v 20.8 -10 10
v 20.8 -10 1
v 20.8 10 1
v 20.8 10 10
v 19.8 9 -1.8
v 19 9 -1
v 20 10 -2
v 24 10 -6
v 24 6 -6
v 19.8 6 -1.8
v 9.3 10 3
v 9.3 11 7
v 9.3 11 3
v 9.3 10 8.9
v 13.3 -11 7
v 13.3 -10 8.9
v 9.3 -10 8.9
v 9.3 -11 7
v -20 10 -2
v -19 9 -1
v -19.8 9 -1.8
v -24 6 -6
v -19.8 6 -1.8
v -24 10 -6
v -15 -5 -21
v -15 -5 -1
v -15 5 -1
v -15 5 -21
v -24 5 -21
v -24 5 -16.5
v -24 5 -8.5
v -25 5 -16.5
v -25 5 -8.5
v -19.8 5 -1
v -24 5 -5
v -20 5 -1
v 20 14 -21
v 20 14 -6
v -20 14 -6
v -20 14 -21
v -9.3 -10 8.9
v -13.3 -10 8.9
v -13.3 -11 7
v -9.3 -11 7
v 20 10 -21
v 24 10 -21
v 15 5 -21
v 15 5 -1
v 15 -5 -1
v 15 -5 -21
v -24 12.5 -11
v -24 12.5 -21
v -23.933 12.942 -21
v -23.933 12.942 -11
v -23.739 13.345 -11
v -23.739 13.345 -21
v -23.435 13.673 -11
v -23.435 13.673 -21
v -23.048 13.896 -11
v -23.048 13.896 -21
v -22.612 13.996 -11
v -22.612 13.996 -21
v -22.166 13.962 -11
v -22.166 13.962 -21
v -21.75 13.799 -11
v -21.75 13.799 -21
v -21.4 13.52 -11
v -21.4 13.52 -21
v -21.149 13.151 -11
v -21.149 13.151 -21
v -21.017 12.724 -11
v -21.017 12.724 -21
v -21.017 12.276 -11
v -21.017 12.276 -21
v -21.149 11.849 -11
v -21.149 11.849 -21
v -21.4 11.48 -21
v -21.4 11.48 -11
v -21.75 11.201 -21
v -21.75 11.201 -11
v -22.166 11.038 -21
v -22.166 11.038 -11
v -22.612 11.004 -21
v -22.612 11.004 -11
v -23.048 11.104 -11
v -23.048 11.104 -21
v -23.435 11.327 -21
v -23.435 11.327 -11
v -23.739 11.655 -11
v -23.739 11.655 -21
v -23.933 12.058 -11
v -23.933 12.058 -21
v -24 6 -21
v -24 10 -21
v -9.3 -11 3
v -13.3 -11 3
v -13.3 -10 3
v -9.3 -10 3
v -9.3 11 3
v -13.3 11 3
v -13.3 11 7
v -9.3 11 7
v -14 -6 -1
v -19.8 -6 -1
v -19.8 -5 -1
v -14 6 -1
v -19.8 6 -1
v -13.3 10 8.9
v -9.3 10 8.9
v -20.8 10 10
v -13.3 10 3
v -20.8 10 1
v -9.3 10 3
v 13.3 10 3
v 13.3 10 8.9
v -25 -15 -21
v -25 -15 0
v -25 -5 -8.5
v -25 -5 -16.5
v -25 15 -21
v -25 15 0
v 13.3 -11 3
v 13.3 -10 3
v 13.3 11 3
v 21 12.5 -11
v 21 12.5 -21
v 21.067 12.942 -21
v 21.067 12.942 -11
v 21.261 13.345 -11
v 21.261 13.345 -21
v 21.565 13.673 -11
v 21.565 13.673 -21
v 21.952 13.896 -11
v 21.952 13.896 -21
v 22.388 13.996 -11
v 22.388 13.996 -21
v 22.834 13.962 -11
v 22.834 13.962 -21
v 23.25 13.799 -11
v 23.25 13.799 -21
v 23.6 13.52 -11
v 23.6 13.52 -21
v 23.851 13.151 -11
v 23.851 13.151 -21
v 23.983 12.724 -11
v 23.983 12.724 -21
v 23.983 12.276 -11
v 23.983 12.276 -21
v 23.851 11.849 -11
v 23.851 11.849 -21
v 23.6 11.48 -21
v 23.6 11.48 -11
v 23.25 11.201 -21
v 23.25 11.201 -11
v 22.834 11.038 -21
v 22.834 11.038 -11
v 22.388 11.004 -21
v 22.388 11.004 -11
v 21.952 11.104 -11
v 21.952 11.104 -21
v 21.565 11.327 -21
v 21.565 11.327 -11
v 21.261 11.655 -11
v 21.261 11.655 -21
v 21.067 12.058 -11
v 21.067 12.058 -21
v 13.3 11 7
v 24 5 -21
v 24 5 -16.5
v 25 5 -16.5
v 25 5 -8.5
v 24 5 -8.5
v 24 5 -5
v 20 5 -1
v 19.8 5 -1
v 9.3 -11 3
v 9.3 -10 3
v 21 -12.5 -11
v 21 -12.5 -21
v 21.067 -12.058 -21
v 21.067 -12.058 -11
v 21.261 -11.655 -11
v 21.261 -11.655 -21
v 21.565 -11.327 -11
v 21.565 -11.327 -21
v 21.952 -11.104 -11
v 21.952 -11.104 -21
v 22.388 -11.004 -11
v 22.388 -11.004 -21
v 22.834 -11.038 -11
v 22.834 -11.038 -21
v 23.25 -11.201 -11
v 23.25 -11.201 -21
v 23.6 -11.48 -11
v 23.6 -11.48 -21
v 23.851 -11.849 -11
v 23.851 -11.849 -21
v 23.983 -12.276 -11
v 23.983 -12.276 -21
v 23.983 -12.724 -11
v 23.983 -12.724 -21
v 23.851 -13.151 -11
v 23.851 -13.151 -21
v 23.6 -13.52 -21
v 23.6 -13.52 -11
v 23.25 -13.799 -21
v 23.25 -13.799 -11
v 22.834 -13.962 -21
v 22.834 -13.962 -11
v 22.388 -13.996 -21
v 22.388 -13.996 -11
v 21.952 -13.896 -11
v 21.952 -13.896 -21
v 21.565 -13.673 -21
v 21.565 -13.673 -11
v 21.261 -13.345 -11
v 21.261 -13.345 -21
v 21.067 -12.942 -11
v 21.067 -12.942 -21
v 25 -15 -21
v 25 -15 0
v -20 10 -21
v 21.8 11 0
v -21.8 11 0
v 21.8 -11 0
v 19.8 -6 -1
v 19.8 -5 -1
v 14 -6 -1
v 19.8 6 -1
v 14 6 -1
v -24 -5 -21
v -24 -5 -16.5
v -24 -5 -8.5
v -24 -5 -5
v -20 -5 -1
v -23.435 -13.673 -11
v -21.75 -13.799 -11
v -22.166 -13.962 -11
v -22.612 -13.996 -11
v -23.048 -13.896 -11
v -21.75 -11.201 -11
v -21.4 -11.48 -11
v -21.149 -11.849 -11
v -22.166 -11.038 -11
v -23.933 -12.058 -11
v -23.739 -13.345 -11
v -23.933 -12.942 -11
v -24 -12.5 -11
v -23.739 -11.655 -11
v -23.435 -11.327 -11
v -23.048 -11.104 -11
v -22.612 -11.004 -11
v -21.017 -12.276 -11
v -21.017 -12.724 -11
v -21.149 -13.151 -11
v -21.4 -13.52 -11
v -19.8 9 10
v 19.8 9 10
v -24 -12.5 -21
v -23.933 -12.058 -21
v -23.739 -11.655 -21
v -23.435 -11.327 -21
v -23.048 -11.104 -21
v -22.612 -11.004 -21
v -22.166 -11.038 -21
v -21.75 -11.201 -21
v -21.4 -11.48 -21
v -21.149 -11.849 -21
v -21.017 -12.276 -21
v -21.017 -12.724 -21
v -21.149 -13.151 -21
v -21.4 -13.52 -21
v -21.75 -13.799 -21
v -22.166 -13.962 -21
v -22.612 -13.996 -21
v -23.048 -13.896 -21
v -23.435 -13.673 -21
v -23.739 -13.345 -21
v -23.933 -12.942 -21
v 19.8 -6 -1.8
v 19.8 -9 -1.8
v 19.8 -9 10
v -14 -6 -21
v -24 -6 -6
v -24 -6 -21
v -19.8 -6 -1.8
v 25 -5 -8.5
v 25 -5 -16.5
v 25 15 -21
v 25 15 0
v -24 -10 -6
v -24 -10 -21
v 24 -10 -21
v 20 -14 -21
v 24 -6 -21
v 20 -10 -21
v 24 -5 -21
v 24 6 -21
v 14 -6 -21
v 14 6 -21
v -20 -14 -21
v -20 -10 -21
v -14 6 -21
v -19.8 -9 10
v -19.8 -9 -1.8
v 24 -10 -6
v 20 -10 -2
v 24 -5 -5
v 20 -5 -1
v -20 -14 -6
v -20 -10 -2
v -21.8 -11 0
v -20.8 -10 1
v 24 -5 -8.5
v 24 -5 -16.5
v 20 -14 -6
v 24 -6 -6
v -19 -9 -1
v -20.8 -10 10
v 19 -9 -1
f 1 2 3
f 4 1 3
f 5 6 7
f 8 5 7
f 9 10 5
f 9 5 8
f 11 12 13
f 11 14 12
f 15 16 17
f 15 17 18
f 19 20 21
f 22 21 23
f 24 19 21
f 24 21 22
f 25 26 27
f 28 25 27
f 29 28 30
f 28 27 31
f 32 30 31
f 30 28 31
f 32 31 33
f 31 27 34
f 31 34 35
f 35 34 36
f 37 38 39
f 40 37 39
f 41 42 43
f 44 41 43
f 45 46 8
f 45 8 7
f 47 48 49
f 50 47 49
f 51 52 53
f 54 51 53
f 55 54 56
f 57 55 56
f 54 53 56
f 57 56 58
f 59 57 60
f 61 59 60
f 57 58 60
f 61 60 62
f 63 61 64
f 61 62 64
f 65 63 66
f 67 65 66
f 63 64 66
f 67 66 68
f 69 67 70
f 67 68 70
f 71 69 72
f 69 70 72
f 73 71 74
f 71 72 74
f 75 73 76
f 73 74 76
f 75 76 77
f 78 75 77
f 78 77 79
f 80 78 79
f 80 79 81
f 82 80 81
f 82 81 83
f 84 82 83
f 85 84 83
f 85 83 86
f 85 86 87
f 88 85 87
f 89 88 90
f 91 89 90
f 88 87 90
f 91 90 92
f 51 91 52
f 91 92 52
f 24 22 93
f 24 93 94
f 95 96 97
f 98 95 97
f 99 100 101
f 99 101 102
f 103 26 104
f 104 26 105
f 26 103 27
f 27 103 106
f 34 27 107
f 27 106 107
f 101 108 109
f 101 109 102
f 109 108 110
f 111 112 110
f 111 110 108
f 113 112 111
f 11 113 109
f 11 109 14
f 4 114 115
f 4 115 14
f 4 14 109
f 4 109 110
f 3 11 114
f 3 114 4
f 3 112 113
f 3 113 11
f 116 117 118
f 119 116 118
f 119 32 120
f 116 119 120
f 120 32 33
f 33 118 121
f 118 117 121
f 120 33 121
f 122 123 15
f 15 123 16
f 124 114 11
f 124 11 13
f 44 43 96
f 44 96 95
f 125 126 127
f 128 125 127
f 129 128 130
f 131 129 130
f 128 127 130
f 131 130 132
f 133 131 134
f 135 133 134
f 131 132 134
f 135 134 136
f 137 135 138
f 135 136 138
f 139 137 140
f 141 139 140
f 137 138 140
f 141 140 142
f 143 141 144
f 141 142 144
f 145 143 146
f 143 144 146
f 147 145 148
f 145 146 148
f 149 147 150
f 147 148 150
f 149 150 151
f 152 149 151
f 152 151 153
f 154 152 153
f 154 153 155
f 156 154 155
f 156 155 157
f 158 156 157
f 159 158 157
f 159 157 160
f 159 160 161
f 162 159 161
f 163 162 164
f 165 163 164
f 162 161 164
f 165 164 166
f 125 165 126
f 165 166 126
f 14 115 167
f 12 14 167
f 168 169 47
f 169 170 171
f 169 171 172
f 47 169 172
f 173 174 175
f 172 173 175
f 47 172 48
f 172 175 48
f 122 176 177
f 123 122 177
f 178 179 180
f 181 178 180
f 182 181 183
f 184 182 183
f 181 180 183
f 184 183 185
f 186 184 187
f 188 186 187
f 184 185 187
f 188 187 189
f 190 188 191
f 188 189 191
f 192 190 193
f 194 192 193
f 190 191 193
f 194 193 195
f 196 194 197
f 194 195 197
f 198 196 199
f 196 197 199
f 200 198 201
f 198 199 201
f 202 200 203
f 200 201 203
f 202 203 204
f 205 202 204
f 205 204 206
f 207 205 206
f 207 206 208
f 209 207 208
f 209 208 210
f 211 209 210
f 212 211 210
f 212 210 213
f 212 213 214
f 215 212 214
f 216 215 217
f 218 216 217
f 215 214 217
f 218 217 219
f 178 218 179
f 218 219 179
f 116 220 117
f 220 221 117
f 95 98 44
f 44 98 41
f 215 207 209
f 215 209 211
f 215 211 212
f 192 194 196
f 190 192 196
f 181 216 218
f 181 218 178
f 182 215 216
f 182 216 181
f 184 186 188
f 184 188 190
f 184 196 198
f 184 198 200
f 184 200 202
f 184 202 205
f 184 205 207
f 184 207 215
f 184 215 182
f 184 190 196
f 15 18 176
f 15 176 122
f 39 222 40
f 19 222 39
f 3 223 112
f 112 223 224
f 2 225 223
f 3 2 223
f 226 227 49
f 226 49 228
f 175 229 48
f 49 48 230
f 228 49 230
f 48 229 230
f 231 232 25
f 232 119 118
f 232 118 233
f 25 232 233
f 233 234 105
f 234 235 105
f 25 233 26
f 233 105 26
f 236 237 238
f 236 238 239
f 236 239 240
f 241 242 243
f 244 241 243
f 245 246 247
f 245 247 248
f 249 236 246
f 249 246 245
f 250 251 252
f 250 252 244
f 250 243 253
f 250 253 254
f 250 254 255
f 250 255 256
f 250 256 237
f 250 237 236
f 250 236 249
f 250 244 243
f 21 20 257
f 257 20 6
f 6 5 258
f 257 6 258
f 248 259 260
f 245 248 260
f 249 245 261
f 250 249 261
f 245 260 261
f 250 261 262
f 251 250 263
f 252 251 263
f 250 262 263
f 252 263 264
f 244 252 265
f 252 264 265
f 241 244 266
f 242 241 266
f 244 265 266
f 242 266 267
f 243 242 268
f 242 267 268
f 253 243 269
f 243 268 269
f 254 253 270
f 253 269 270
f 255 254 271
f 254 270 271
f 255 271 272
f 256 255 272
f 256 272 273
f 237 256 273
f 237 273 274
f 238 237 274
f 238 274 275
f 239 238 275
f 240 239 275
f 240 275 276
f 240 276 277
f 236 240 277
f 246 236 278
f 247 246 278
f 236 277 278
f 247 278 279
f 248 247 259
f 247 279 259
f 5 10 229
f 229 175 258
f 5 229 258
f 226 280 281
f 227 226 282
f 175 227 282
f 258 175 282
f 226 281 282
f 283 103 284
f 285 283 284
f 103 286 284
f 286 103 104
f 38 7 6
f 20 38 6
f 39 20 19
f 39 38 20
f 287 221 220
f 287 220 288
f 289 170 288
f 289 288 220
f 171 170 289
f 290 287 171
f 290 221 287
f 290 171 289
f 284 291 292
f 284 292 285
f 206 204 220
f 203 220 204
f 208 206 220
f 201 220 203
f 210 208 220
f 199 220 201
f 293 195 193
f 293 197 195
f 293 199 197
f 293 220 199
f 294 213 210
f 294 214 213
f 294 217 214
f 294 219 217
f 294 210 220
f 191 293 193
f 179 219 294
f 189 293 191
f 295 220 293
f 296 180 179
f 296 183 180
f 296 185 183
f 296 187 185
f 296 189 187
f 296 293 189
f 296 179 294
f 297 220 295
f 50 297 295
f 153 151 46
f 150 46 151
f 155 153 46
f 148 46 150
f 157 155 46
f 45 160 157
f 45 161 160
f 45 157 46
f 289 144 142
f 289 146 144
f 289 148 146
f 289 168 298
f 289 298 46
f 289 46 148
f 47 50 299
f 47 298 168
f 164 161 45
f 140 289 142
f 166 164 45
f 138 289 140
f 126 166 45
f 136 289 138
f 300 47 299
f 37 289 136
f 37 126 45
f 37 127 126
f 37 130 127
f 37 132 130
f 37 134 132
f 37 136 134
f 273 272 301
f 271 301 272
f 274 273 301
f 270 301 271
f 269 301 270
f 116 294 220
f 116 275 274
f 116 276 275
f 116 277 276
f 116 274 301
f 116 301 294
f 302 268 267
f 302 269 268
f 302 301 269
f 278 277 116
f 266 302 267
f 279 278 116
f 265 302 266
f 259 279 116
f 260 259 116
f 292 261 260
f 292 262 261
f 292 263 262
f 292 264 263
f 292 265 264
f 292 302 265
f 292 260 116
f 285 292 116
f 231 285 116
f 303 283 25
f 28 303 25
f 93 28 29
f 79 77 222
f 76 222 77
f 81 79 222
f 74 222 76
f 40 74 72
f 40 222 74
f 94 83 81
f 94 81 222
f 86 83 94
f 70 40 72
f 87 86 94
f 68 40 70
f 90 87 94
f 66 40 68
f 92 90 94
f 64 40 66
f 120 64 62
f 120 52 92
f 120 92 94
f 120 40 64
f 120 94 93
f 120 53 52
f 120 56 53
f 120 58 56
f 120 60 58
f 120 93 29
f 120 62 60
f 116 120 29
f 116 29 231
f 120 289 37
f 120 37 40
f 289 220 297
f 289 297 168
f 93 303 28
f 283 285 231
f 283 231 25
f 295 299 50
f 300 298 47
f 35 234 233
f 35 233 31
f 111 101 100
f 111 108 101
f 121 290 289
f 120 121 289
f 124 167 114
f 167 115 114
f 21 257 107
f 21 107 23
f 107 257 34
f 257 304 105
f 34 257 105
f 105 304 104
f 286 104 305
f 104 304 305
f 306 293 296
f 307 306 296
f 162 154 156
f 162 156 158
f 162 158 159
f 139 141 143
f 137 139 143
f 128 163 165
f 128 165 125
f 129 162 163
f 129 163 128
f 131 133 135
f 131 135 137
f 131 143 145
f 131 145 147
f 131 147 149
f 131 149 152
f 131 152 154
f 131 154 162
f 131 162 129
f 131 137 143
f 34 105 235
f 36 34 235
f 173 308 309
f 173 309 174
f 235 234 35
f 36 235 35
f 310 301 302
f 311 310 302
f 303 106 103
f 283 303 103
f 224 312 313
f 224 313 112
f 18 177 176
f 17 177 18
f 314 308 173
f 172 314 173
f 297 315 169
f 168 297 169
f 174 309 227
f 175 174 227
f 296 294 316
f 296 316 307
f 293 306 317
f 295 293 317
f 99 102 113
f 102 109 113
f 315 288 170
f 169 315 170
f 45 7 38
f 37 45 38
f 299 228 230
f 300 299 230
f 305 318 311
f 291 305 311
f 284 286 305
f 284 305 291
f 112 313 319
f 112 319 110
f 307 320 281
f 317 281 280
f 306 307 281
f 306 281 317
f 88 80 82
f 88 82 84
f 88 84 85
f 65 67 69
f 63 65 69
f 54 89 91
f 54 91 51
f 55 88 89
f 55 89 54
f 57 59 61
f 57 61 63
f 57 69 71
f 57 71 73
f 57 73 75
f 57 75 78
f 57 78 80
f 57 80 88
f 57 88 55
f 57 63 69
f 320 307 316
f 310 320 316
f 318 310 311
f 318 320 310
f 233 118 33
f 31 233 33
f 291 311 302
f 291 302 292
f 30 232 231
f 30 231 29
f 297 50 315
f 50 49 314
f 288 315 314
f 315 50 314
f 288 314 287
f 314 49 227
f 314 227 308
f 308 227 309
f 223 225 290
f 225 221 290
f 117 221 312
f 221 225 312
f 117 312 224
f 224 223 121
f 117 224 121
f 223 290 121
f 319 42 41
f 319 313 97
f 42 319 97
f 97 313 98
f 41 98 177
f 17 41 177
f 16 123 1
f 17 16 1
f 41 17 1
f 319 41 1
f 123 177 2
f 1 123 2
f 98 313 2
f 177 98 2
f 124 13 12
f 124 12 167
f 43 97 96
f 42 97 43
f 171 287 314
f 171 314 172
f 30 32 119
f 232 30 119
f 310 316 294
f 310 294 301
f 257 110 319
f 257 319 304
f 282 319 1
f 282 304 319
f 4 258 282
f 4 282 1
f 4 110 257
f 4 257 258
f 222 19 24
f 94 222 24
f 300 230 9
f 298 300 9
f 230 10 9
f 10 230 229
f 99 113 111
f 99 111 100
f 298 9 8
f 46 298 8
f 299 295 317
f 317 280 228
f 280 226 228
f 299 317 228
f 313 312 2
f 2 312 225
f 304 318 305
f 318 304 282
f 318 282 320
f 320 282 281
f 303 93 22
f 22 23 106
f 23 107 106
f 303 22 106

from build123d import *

# Parameters (mm, degrees)
SKETCH1_W            = 41.6
SKETCH1_H            = 20
SKETCH1_W_2          = 39.6
SKETCH1_H_2          = 18
BOSS_EXTRUDE2_DEPTH  = 10
SKETCH2_W            = 4
SKETCH2_H            = 10
BOSS_EXTRUDE3_DEPTH  = 1
SKETCH3_W            = 3
SKETCH3_H            = 1
CUT_EXTRUDE1_DEPTH   = 27
SKETCH4_W            = 4
SKETCH4_H            = 10
BOSS_EXTRUDE4_DEPTH  = 1
SKETCH5_W            = 3
SKETCH5_H            = 1
CUT_EXTRUDE2_DEPTH   = 27
SKETCH6_W            = 50
SKETCH6_H            = 30
SKETCH6_W_2          = 41.6
SKETCH6_H_2          = 20
SKETCH6_W_3          = 39.6
SKETCH6_H_3          = 18
BOSS_EXTRUDE6_DEPTH  = 1
CHAMFER1_SIZE        = 1
SKETCH7_W            = 50
SKETCH7_H            = 30
SKETCH7_W_2          = 48
SKETCH7_H_2          = 28
BOSS_EXTRUDE7_DEPTH  = 20
SKETCH8_W            = 4.2
SKETCH8_H            = 1
BOSS_EXTRUDE8_DEPTH  = 20
SKETCH9_W            = 4.2
SKETCH9_H            = 1
BOSS_EXTRUDE9_DEPTH  = 20
SKETCH10_W           = 4
SKETCH10_H           = 4
BOSS_EXTRUDE10_DEPTH = 20
SKETCH11_W           = 2
SKETCH11_H           = 10
CUT_EXTRUDE3_DEPTH   = 1
SKETCH12_W           = 2
SKETCH12_H           = 10
CUT_EXTRUDE4_DEPTH   = 1
SKETCH13_R           = 1.5
CUT_EXTRUDE5_DEPTH   = 10
CHAMFER2_SIZE        = 5
CHAMFER3_SIZE        = 5
CHAMFER4_SIZE        = 4


# Some blends are built 0.0001 mm under size
with BuildPart() as part:
    # Sketch1 → Boss-Extrude2 (new body)
    with BuildSketch(Plane.XY):
        Rectangle(SKETCH1_W, SKETCH1_H)
        Rectangle(SKETCH1_W_2, SKETCH1_H_2, mode=Mode.SUBTRACT)
    extrude(amount=BOSS_EXTRUDE2_DEPTH)

    # Sketch2 → Boss-Extrude3 (add)
    with BuildSketch(Plane.XZ.offset(10)):
        with Locations((-11.3, 5)):
            Rectangle(SKETCH2_W, SKETCH2_H)
        with Locations((11.3, 5)):
            Rectangle(SKETCH2_W, SKETCH2_H)
    extrude(amount=BOSS_EXTRUDE3_DEPTH)

    # Sketch3 → Cut-Extrude1 (cut)
    with BuildSketch(Plane.ZY.offset(13.3)):
        Polygon((8.900149248, -10), (7, -11), (10, -11), (10, -10), align=None)
        with Locations((1.5, -10.5)):
            Rectangle(SKETCH3_W, SKETCH3_H)
    extrude(amount=-CUT_EXTRUDE1_DEPTH, mode=Mode.SUBTRACT)

    # Sketch4 → Boss-Extrude4 (add)
    with BuildSketch(Plane(origin=(0, 10, 0), x_dir=(1, 0, 0), z_dir=(0, 1, 0))):
        with Locations((11.3, -5)):
            Rectangle(SKETCH4_W, SKETCH4_H)
        with Locations((-11.3, -5)):
            Rectangle(SKETCH4_W, SKETCH4_H)
    extrude(amount=BOSS_EXTRUDE4_DEPTH)

    # Sketch5 → Cut-Extrude2 (cut)
    with BuildSketch(Plane(origin=(13.3, 0, 0), x_dir=(0, 0, -1), z_dir=(1, 0, 0))):
        Polygon((-7, 11), (-10, 11), (-10, 10), (-8.900149248, 10), align=None)
        with Locations((-1.5, 10.5)):
            Rectangle(SKETCH5_W, SKETCH5_H)
    extrude(amount=-CUT_EXTRUDE2_DEPTH, mode=Mode.SUBTRACT)

    # Sketch6 → Boss-Extrude6 (add)
    # profile 1 of 2: a face of its own
    with BuildSketch(Plane(origin=(0, 0, 0), x_dir=(-1, 0, 0), z_dir=(0, 0, -1))):
        Rectangle(SKETCH6_W, SKETCH6_H)
        Rectangle(SKETCH6_W_2, SKETCH6_H_2, mode=Mode.SUBTRACT)
    # profile 2 of 2: a face of its own
    with BuildSketch(Plane(origin=(0, 0, 0), x_dir=(-1, 0, 0), z_dir=(0, 0, -1))):
        Rectangle(SKETCH6_W_2, SKETCH6_H_2)
        Rectangle(SKETCH6_W_3, SKETCH6_H_3, mode=Mode.SUBTRACT)
    extrude(amount=BOSS_EXTRUDE6_DEPTH)

    # Chamfer1
    chamfer1_edges = [part.edges().sort_by_distance(p)[0] for p in [
        (0, -10, 0),
        (-20.8, 0, 0),
        (0, 10, 0),
        (20.8, 0, 0),
    ]]
    chamfer(chamfer1_edges, length=CHAMFER1_SIZE)

    # Sketch7 → Boss-Extrude7 (add)
    with BuildSketch(Plane(origin=(0, 0, -1), x_dir=(-1, 0, 0), z_dir=(0, 0, -1))):
        Rectangle(SKETCH7_W, SKETCH7_H)
        Rectangle(SKETCH7_W_2, SKETCH7_H_2, mode=Mode.SUBTRACT)
    extrude(amount=BOSS_EXTRUDE7_DEPTH)

    # Sketch8 → Boss-Extrude8 (add)
    with BuildSketch(Plane(origin=(0, 0, -1), x_dir=(-1, 0, 0), z_dir=(0, 0, -1))):
        Polygon((-15, -5), (-19.8, -5), (-19.8, -6), (-14, -6), (-14, 6), (-19.8, 6), (-19.8, 5), (-15, 5), align=None)
        with Locations((-21.9, 5.5)):
            Rectangle(SKETCH8_W, SKETCH8_H)
        with Locations((-21.9, -5.5)):
            Rectangle(SKETCH8_W, SKETCH8_H)
    extrude(amount=BOSS_EXTRUDE8_DEPTH)

    # Sketch9 → Boss-Extrude9 (add)
    with BuildSketch(Plane(origin=(0, 0, -1), x_dir=(-1, 0, 0), z_dir=(0, 0, -1))):
        Polygon((15, 5), (19.8, 5), (19.8, 6), (14, 6), (14, -6), (19.8, -6), (19.8, -5), (15, -5), align=None)
        with Locations((21.9, 5.5)):
            Rectangle(SKETCH9_W, SKETCH9_H)
        with Locations((21.9, -5.5)):
            Rectangle(SKETCH9_W, SKETCH9_H)
    extrude(amount=BOSS_EXTRUDE9_DEPTH)

    # Sketch10 → Boss-Extrude10 (add)
    with BuildSketch(Plane(origin=(0, 0, -1), x_dir=(-1, 0, 0), z_dir=(0, 0, -1))):
        with Locations((-22, 12)):
            Rectangle(SKETCH10_W, SKETCH10_H)
        with Locations((22, 12)):
            Rectangle(SKETCH10_W, SKETCH10_H)
        with Locations((22, -12)):
            Rectangle(SKETCH10_W, SKETCH10_H)
        with Locations((-22, -12)):
            Rectangle(SKETCH10_W, SKETCH10_H)
    extrude(amount=BOSS_EXTRUDE10_DEPTH)

    # Sketch11 → Cut-Extrude3 (cut)
    with BuildSketch(Plane.ZY.offset(25)):
        Polygon((-10.5, -5), (-10.5, 5), (-16.5, 5), (-16.5, 0), (-16.5, -5), align=None)
        with Locations((-9.5, 0)):
            Rectangle(SKETCH11_W, SKETCH11_H)
    extrude(amount=-CUT_EXTRUDE3_DEPTH, mode=Mode.SUBTRACT)

    # Sketch12 → Cut-Extrude4 (cut)
    with BuildSketch(Plane(origin=(25, 0, 0), x_dir=(0, 0, -1), z_dir=(1, 0, 0))):
        with Locations((9.5, 0)):
            Rectangle(SKETCH12_W, SKETCH12_H)
        Polygon((16.5, 5), (10.5, 5), (10.5, -5), (16.5, -5), (16.5, 0), align=None)
    extrude(amount=-CUT_EXTRUDE4_DEPTH, mode=Mode.SUBTRACT)

    # Sketch13 → Cut-Extrude5 (cut)
    with BuildSketch(Plane(origin=(0, 0, -21), x_dir=(-1, 0, 0), z_dir=(0, 0, -1))):
        with Locations((-22.5, 12.5)):
            Circle(SKETCH13_R)
        with Locations((22.5, 12.5)):
            Circle(SKETCH13_R)
        with Locations((22.5, -12.5)):
            Circle(SKETCH13_R)
        with Locations((-22.5, -12.5)):
            Circle(SKETCH13_R)
    extrude(amount=-CUT_EXTRUDE5_DEPTH, mode=Mode.SUBTRACT)

    # Chamfer2
    chamfer2_edges = [part.edges().sort_by_distance(p)[0] for p in [
        (0, 14, -1),
        (0, -14, -1),
    ]]
    chamfer(chamfer2_edges, length=CHAMFER2_SIZE - 0.0001)  # a hair under: the kernel refuses the full size

    # Chamfer3
    # the kernel refuses this chamfer: 5 mm, written as the material it adds along each edge
    with BuildSketch(Plane(origin=(24, -21.85851494, -1), x_dir=(-0.9996219169112968, 0, 0.02749587661058636), z_dir=(0, 1, 0))) as chamfer3_piece_1_section:
        Polygon((CHAMFER3_SIZE * 0.999621916911, -CHAMFER3_SIZE * 0.0274958766106), (-CHAMFER3_SIZE * 0.0274958766106, -CHAMFER3_SIZE * 0.999621916911), (0, 0), align=None)
    chamfer3_piece_1 = extrude(amount=28.71692988, mode=Mode.PRIVATE)
    chamfer3_piece_1 = split(chamfer3_piece_1, bisect_by=Plane(origin=(19.8, -10.000025, -1.99995), z_dir=(1, 0, 0)), keep=Keep.TOP, mode=Mode.PRIVATE)
    chamfer3_piece_1 = split(chamfer3_piece_1, bisect_by=Plane(origin=(19.999975, -5, -1.99995), z_dir=(0, -1, 0)), keep=Keep.TOP, mode=Mode.PRIVATE)
    chamfer3_piece_1 = split(chamfer3_piece_1, bisect_by=Plane(origin=(19.999975, -10.0000375, -1.9999375), z_dir=(0, 0.7071067811865476, -0.7071067811865476)), keep=Keep.TOP, mode=Mode.PRIVATE)
    add(chamfer3_piece_1)
    with BuildSketch(Plane(origin=(24, -21.85851494, -1), x_dir=(-0.9996219169112968, 0, 0.02749587661058636), z_dir=(0, 1, 0))) as chamfer3_piece_2_section:
        Polygon((CHAMFER3_SIZE * 0.999621916911, -CHAMFER3_SIZE * 0.0274958766106), (-CHAMFER3_SIZE * 0.0274958766106, -CHAMFER3_SIZE * 0.999621916911), (0, 0), align=None)
    chamfer3_piece_2 = extrude(amount=28.71692988, mode=Mode.PRIVATE)
    chamfer3_piece_2 = split(chamfer3_piece_2, bisect_by=Plane(origin=(19.599975009, -9, -1.399950019), z_dir=(0, -1, 0)), keep=Keep.TOP, mode=Mode.PRIVATE)
    chamfer3_piece_2 = split(chamfer3_piece_2, bisect_by=Plane(origin=(19.599975009, -9.300037514, -1.299937514), z_dir=(0, 0.7071067811865476, -0.7071067811865476)), keep=Keep.TOP, mode=Mode.PRIVATE)
    add(chamfer3_piece_2)
    with BuildSketch(Plane(origin=(24, -21.85851494, -1), x_dir=(-0.9996219169112968, 0, 0.02749587661058636), z_dir=(0, 1, 0))) as chamfer3_piece_3_section:
        Polygon((CHAMFER3_SIZE * 0.999621916911, -CHAMFER3_SIZE * 0.0274958766106), (-CHAMFER3_SIZE * 0.0274958766106, -CHAMFER3_SIZE * 0.999621916911), (0, 0), align=None)
    chamfer3_piece_3 = extrude(amount=28.71692988, mode=Mode.PRIVATE)
    chamfer3_piece_3 = split(chamfer3_piece_3, bisect_by=Plane(origin=(19.8, 6.42920747, -1.451851852), z_dir=(1, 0, 0)), keep=Keep.TOP, mode=Mode.PRIVATE)
    chamfer3_piece_3 = split(chamfer3_piece_3, bisect_by=Plane(origin=(19.903703704, 5, -1.451851852), z_dir=(0, 1, 0)), keep=Keep.TOP, mode=Mode.PRIVATE)
    add(chamfer3_piece_3)
    with BuildSketch(Plane(origin=(-24, 21.85851494, -1), x_dir=(0.9996219169112968, 0, 0.02749587661058636), z_dir=(0, -1, 0))) as chamfer3_piece_4_section:
        Polygon((CHAMFER3_SIZE * 0.999621916911, -CHAMFER3_SIZE * 0.0274958766106), (-CHAMFER3_SIZE * 0.0274958766106, -CHAMFER3_SIZE * 0.999621916911), (0, 0), align=None)
    chamfer3_piece_4 = extrude(amount=28.71692988, mode=Mode.PRIVATE)
    chamfer3_piece_4 = split(chamfer3_piece_4, bisect_by=Plane(origin=(-19.8, 10.000025, -1.99995), z_dir=(-1, 0, 0)), keep=Keep.TOP, mode=Mode.PRIVATE)
    chamfer3_piece_4 = split(chamfer3_piece_4, bisect_by=Plane(origin=(-19.999975, 15, -1.99995), z_dir=(0, -1, 0)), keep=Keep.TOP, mode=Mode.PRIVATE)
    chamfer3_piece_4 = split(chamfer3_piece_4, bisect_by=Plane(origin=(-19.999975, 5, -1.99995), z_dir=(0, 1, 0)), keep=Keep.TOP, mode=Mode.PRIVATE)
    add(chamfer3_piece_4)
    with BuildSketch(Plane(origin=(-24, 21.85851494, -1), x_dir=(0.9996219169112968, 0, 0.02749587661058636), z_dir=(0, -1, 0))) as chamfer3_piece_5_section:
        Polygon((CHAMFER3_SIZE * 0.999621916911, -CHAMFER3_SIZE * 0.0274958766106), (-CHAMFER3_SIZE * 0.0274958766106, -CHAMFER3_SIZE * 0.999621916911), (0, 0), align=None)
    chamfer3_piece_5 = extrude(amount=28.71692988, mode=Mode.PRIVATE)
    chamfer3_piece_5 = split(chamfer3_piece_5, bisect_by=Plane(origin=(-19.599975009, 9, -1.399950019), z_dir=(0, 1, 0)), keep=Keep.TOP, mode=Mode.PRIVATE)
    chamfer3_piece_5 = split(chamfer3_piece_5, bisect_by=Plane(origin=(-19.599975009, 15, -1.399950019), z_dir=(0, -1, 0)), keep=Keep.TOP, mode=Mode.PRIVATE)
    add(chamfer3_piece_5)
    with BuildSketch(Plane(origin=(-24, 21.85851494, -1), x_dir=(0.9996219169112968, 0, 0.02749587661058636), z_dir=(0, -1, 0))) as chamfer3_piece_6_section:
        Polygon((CHAMFER3_SIZE * 0.999621916911, -CHAMFER3_SIZE * 0.0274958766106), (-CHAMFER3_SIZE * 0.0274958766106, -CHAMFER3_SIZE * 0.999621916911), (0, 0), align=None)
    chamfer3_piece_6 = extrude(amount=28.71692988, mode=Mode.PRIVATE)
    chamfer3_piece_6 = split(chamfer3_piece_6, bisect_by=Plane(origin=(-19.8, -6.42920747, -1.451851852), z_dir=(-1, 0, 0)), keep=Keep.TOP, mode=Mode.PRIVATE)
    chamfer3_piece_6 = split(chamfer3_piece_6, bisect_by=Plane(origin=(-19.903703704, -6, -1.451851852), z_dir=(0, -1, 0)), keep=Keep.TOP, mode=Mode.PRIVATE)
    add(chamfer3_piece_6)
    with BuildSketch(Plane(origin=(-24, 6.85841494, -1), x_dir=(0.9996219169112968, 0, 0.02749587661058636), z_dir=(0, -1, 0))) as chamfer3_piece_7_section:
        Polygon((CHAMFER3_SIZE * 0.999621916911, -CHAMFER3_SIZE * 0.0274958766106), (-CHAMFER3_SIZE * 0.0274958766106, -CHAMFER3_SIZE * 0.999621916911), (0, 0), align=None)
    chamfer3_piece_7 = extrude(amount=28.71692988, mode=Mode.PRIVATE)
    chamfer3_piece_7 = split(chamfer3_piece_7, bisect_by=Plane(origin=(-19.8, 6.42920747, -1.451851852), z_dir=(-1, 0, 0)), keep=Keep.TOP, mode=Mode.PRIVATE)
    chamfer3_piece_7 = split(chamfer3_piece_7, bisect_by=Plane(origin=(-19.903703704, 5, -1.451851852), z_dir=(0, 1, 0)), keep=Keep.TOP, mode=Mode.PRIVATE)
    add(chamfer3_piece_7)
    with BuildSketch(Plane(origin=(-24, -6, -1), x_dir=(0.9996219169112968, 0, 0.02749587661058636), z_dir=(0, -1, 0))) as chamfer3_piece_8_section:
        Polygon((CHAMFER3_SIZE * 0.999621916911, -CHAMFER3_SIZE * 0.0274958766106), (-CHAMFER3_SIZE * 0.0274958766106, -CHAMFER3_SIZE * 0.999621916911), (0, 0), align=None)
    chamfer3_piece_8 = extrude(amount=15.85851494, mode=Mode.PRIVATE)
    chamfer3_piece_8 = split(chamfer3_piece_8, bisect_by=Plane(origin=(-19.8, -7.5, -1.451851852), z_dir=(-1, 0, 0)), keep=Keep.TOP, mode=Mode.PRIVATE)
    chamfer3_piece_8 = split(chamfer3_piece_8, bisect_by=Plane(origin=(-19.903703704, -8.475975926, -0.475875926), z_dir=(0, 0.7071067811865476, -0.7071067811865476)), keep=Keep.TOP, mode=Mode.PRIVATE)
    add(chamfer3_piece_8)
    with BuildSketch(Plane(origin=(-24, 6.85841494, -1), x_dir=(0.9996219169112968, 0, 0.02749587661058636), z_dir=(0, -1, 0))) as chamfer3_piece_9_section:
        Polygon((CHAMFER3_SIZE * 0.999621916911, -CHAMFER3_SIZE * 0.0274958766106), (-CHAMFER3_SIZE * 0.0274958766106, -CHAMFER3_SIZE * 0.999621916911), (0, 0), align=None)
    chamfer3_piece_9 = extrude(amount=28.71692988, mode=Mode.PRIVATE)
    chamfer3_piece_9 = split(chamfer3_piece_9, bisect_by=Plane(origin=(-19.599975009, -9, -1.399950019), z_dir=(0, -1, 0)), keep=Keep.TOP, mode=Mode.PRIVATE)
    chamfer3_piece_9 = split(chamfer3_piece_9, bisect_by=Plane(origin=(-19.599975009, -9.300037514, -1.299937514), z_dir=(0, 0.7071067811865476, -0.7071067811865476)), keep=Keep.TOP, mode=Mode.PRIVATE)
    add(chamfer3_piece_9)
    with BuildSketch(Plane(origin=(24, -6.85841494, -1), x_dir=(-0.9996219169112968, 0, 0.02749587661058636), z_dir=(0, 1, 0))) as chamfer3_piece_10_section:
        Polygon((CHAMFER3_SIZE * 0.999621916911, -CHAMFER3_SIZE * 0.0274958766106), (-CHAMFER3_SIZE * 0.0274958766106, -CHAMFER3_SIZE * 0.999621916911), (0, 0), align=None)
    chamfer3_piece_10 = extrude(amount=28.71692988, mode=Mode.PRIVATE)
    chamfer3_piece_10 = split(chamfer3_piece_10, bisect_by=Plane(origin=(19.8, -6.42920747, -1.451851852), z_dir=(1, 0, 0)), keep=Keep.TOP, mode=Mode.PRIVATE)
    chamfer3_piece_10 = split(chamfer3_piece_10, bisect_by=Plane(origin=(19.903703704, -5, -1.451851852), z_dir=(0, -1, 0)), keep=Keep.TOP, mode=Mode.PRIVATE)
    add(chamfer3_piece_10)
    with BuildSketch(Plane(origin=(24, -6.85841494, -1), x_dir=(-0.9996219169112968, 0, 0.02749587661058636), z_dir=(0, 1, 0))) as chamfer3_piece_11_section:
        Polygon((CHAMFER3_SIZE * 0.999621916911, -CHAMFER3_SIZE * 0.0274958766106), (-CHAMFER3_SIZE * 0.0274958766106, -CHAMFER3_SIZE * 0.999621916911), (0, 0), align=None)
    chamfer3_piece_11 = extrude(amount=28.71692988, mode=Mode.PRIVATE)
    chamfer3_piece_11 = split(chamfer3_piece_11, bisect_by=Plane(origin=(19.8, 7.5, -1.451851852), z_dir=(1, 0, 0)), keep=Keep.TOP, mode=Mode.PRIVATE)
    chamfer3_piece_11 = split(chamfer3_piece_11, bisect_by=Plane(origin=(19.903703704, 15, -1.451851852), z_dir=(0, -1, 0)), keep=Keep.TOP, mode=Mode.PRIVATE)
    chamfer3_piece_11 = split(chamfer3_piece_11, bisect_by=Plane(origin=(19.903703704, 5, -1.451851852), z_dir=(0, 1, 0)), keep=Keep.TOP, mode=Mode.PRIVATE)
    add(chamfer3_piece_11)
    with BuildSketch(Plane(origin=(24, -6.85841494, -1), x_dir=(-0.9996219169112968, 0, 0.02749587661058636), z_dir=(0, 1, 0))) as chamfer3_piece_12_section:
        Polygon((CHAMFER3_SIZE * 0.999621916911, -CHAMFER3_SIZE * 0.0274958766106), (-CHAMFER3_SIZE * 0.0274958766106, -CHAMFER3_SIZE * 0.999621916911), (0, 0), align=None)
    chamfer3_piece_12 = extrude(amount=28.71692988, mode=Mode.PRIVATE)
    chamfer3_piece_12 = split(chamfer3_piece_12, bisect_by=Plane(origin=(19.599975009, 9, -1.399950019), z_dir=(0, 1, 0)), keep=Keep.TOP, mode=Mode.PRIVATE)
    chamfer3_piece_12 = split(chamfer3_piece_12, bisect_by=Plane(origin=(19.599975009, 15, -1.399950019), z_dir=(0, -1, 0)), keep=Keep.TOP, mode=Mode.PRIVATE)
    add(chamfer3_piece_12)

    # Chamfer4
    chamfer4_edges = [part.edges().sort_by_distance(p)[0] for p in [
        (24, 0, -1),
        (-24, 0, -1),
    ]]
    chamfer(chamfer4_edges, length=CHAMFER4_SIZE)


solid = part.part
